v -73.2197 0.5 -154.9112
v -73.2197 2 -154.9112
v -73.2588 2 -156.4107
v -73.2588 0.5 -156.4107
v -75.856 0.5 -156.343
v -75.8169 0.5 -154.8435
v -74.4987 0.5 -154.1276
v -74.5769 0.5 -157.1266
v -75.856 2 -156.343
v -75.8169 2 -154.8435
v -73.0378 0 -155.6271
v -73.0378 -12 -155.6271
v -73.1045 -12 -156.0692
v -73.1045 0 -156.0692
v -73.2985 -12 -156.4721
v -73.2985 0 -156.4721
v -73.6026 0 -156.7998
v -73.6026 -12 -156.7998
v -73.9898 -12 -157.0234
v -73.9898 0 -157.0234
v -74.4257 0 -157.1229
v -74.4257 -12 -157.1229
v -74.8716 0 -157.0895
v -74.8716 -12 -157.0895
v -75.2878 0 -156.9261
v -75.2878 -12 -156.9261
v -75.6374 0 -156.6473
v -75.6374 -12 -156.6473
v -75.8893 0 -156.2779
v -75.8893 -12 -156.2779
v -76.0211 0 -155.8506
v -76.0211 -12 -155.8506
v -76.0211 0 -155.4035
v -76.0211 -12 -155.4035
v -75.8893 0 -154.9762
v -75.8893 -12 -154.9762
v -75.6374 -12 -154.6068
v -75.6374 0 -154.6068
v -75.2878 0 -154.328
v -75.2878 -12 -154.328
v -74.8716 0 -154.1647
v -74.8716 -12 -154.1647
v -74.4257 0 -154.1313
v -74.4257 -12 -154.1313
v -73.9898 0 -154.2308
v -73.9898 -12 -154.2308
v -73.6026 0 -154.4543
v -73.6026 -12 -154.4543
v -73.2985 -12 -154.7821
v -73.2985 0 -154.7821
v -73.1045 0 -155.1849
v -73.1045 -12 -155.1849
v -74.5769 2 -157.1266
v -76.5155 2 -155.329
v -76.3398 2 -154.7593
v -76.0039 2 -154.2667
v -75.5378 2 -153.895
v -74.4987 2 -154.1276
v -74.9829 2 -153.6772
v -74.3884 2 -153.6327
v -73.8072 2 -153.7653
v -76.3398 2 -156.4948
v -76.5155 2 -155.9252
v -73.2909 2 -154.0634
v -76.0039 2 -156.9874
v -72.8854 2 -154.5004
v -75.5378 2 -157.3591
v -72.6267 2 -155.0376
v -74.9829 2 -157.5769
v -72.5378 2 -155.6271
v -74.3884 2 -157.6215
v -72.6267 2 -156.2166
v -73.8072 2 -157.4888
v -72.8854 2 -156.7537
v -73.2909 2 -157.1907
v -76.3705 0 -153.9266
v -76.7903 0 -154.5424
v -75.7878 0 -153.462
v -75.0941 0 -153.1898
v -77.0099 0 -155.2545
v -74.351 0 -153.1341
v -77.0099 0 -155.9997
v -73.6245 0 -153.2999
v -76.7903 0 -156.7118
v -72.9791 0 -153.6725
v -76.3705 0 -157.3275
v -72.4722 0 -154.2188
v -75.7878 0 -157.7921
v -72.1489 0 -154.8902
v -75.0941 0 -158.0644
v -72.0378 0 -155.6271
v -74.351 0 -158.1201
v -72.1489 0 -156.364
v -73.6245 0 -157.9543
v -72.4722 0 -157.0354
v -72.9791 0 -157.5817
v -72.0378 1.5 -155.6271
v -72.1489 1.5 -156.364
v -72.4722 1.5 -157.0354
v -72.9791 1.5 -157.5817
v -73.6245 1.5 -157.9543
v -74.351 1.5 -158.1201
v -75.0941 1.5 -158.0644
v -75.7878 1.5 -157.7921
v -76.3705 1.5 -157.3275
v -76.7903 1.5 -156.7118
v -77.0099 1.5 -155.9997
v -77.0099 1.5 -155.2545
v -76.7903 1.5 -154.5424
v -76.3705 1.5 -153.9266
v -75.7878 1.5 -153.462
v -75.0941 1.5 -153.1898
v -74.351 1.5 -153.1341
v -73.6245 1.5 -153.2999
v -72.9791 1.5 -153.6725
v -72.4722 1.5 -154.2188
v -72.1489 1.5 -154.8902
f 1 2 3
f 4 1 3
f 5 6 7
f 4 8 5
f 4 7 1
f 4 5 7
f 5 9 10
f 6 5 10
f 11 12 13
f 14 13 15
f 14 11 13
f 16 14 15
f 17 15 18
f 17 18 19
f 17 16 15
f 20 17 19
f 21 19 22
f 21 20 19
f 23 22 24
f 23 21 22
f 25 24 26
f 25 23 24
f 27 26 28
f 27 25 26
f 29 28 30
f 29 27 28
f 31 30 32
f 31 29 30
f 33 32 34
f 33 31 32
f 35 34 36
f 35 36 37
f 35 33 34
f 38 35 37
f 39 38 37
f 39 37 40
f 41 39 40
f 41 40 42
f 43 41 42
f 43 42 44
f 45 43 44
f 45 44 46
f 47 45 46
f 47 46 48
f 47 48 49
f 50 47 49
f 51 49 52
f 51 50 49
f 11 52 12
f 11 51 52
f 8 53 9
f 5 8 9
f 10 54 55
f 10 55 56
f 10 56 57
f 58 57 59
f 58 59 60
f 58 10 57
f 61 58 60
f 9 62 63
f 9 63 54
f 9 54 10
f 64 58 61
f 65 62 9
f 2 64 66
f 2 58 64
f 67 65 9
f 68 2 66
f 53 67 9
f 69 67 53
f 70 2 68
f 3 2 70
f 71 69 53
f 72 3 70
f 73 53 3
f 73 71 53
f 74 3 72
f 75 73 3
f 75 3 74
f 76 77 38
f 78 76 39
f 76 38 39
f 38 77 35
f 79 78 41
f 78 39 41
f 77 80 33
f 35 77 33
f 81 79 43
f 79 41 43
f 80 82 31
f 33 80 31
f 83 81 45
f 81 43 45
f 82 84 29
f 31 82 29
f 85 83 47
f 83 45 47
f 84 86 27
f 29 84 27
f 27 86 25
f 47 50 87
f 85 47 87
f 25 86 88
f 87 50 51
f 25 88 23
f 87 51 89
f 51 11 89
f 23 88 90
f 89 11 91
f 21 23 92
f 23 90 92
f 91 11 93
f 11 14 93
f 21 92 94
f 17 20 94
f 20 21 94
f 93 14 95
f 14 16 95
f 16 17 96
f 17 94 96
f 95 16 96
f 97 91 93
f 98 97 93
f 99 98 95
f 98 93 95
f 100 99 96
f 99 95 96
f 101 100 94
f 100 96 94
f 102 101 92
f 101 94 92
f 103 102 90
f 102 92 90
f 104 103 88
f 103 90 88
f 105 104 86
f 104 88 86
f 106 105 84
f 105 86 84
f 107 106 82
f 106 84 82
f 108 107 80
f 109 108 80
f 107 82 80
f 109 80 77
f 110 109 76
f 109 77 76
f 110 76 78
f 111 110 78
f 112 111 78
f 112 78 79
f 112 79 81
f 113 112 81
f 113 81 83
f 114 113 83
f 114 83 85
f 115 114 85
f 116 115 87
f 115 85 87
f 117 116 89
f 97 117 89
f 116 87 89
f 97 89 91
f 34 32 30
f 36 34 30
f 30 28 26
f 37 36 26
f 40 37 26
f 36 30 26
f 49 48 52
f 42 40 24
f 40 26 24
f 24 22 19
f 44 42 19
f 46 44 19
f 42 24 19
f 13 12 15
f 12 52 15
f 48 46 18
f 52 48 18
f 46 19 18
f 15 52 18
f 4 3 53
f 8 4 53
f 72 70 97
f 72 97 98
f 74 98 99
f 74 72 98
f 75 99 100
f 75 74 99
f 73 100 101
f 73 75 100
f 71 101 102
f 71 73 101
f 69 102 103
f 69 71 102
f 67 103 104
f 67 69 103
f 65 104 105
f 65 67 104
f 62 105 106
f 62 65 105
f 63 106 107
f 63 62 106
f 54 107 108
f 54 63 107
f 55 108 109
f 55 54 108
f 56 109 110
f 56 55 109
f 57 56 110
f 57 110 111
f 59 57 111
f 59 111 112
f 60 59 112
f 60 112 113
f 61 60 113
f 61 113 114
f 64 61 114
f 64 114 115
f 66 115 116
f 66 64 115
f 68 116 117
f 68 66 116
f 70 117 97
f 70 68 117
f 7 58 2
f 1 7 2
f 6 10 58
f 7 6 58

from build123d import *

# Parameters (mm, degrees)
SKETCH1_R           = 1.5
BOSS_EXTRUDE1_DEPTH = 12
SKETCH2_R           = 2.5
BOSS_EXTRUDE2_DEPTH = 2
CHAMFER1_SIZE       = 0.5
CUT_EXTRUDE1_DEPTH  = 1.5


with BuildPart() as part:
    # Sketch1 → Boss-Extrude1 (new body)
    with BuildSketch(Plane(origin=(0, 0, 0), x_dir=(1, 0, 0), z_dir=(0, 1, 0))):
        with Locations((-74.537838868, 155.62707166)):
            Circle(SKETCH1_R)
    extrude(amount=-BOSS_EXTRUDE1_DEPTH)

    # Sketch2 → Boss-Extrude2 (add)
    with BuildSketch(Plane(origin=(0, 0, 0), x_dir=(1, 0, 0), z_dir=(0, 1, 0))):
        with Locations((-74.537838868, 155.62707166)):
            Circle(SKETCH2_R)
    extrude(amount=BOSS_EXTRUDE2_DEPTH)

    # Chamfer1
    chamfer1_edges = [part.edges().sort_by_distance(p)[0] for p in [
        (-77.037838868, 2, -155.62707166),
    ]]
    chamfer(chamfer1_edges, length=CHAMFER1_SIZE)

    # Sketch3 → Cut-Extrude1 (cut)
    with BuildSketch(Plane(origin=(0, 2, 0), x_dir=(1, 0, 0), z_dir=(0, 1, 0))):
        Polygon((-73.219689644, 154.911192742), (-73.258794928, 156.410682915), (-74.576944151, 157.126561832), (-75.855988091, 156.342950577), (-75.816882808, 154.843460404), (-74.498733584, 154.127581487), align=None)
    extrude(amount=-CUT_EXTRUDE1_DEPTH, mode=Mode.SUBTRACT)


solid = part.part
